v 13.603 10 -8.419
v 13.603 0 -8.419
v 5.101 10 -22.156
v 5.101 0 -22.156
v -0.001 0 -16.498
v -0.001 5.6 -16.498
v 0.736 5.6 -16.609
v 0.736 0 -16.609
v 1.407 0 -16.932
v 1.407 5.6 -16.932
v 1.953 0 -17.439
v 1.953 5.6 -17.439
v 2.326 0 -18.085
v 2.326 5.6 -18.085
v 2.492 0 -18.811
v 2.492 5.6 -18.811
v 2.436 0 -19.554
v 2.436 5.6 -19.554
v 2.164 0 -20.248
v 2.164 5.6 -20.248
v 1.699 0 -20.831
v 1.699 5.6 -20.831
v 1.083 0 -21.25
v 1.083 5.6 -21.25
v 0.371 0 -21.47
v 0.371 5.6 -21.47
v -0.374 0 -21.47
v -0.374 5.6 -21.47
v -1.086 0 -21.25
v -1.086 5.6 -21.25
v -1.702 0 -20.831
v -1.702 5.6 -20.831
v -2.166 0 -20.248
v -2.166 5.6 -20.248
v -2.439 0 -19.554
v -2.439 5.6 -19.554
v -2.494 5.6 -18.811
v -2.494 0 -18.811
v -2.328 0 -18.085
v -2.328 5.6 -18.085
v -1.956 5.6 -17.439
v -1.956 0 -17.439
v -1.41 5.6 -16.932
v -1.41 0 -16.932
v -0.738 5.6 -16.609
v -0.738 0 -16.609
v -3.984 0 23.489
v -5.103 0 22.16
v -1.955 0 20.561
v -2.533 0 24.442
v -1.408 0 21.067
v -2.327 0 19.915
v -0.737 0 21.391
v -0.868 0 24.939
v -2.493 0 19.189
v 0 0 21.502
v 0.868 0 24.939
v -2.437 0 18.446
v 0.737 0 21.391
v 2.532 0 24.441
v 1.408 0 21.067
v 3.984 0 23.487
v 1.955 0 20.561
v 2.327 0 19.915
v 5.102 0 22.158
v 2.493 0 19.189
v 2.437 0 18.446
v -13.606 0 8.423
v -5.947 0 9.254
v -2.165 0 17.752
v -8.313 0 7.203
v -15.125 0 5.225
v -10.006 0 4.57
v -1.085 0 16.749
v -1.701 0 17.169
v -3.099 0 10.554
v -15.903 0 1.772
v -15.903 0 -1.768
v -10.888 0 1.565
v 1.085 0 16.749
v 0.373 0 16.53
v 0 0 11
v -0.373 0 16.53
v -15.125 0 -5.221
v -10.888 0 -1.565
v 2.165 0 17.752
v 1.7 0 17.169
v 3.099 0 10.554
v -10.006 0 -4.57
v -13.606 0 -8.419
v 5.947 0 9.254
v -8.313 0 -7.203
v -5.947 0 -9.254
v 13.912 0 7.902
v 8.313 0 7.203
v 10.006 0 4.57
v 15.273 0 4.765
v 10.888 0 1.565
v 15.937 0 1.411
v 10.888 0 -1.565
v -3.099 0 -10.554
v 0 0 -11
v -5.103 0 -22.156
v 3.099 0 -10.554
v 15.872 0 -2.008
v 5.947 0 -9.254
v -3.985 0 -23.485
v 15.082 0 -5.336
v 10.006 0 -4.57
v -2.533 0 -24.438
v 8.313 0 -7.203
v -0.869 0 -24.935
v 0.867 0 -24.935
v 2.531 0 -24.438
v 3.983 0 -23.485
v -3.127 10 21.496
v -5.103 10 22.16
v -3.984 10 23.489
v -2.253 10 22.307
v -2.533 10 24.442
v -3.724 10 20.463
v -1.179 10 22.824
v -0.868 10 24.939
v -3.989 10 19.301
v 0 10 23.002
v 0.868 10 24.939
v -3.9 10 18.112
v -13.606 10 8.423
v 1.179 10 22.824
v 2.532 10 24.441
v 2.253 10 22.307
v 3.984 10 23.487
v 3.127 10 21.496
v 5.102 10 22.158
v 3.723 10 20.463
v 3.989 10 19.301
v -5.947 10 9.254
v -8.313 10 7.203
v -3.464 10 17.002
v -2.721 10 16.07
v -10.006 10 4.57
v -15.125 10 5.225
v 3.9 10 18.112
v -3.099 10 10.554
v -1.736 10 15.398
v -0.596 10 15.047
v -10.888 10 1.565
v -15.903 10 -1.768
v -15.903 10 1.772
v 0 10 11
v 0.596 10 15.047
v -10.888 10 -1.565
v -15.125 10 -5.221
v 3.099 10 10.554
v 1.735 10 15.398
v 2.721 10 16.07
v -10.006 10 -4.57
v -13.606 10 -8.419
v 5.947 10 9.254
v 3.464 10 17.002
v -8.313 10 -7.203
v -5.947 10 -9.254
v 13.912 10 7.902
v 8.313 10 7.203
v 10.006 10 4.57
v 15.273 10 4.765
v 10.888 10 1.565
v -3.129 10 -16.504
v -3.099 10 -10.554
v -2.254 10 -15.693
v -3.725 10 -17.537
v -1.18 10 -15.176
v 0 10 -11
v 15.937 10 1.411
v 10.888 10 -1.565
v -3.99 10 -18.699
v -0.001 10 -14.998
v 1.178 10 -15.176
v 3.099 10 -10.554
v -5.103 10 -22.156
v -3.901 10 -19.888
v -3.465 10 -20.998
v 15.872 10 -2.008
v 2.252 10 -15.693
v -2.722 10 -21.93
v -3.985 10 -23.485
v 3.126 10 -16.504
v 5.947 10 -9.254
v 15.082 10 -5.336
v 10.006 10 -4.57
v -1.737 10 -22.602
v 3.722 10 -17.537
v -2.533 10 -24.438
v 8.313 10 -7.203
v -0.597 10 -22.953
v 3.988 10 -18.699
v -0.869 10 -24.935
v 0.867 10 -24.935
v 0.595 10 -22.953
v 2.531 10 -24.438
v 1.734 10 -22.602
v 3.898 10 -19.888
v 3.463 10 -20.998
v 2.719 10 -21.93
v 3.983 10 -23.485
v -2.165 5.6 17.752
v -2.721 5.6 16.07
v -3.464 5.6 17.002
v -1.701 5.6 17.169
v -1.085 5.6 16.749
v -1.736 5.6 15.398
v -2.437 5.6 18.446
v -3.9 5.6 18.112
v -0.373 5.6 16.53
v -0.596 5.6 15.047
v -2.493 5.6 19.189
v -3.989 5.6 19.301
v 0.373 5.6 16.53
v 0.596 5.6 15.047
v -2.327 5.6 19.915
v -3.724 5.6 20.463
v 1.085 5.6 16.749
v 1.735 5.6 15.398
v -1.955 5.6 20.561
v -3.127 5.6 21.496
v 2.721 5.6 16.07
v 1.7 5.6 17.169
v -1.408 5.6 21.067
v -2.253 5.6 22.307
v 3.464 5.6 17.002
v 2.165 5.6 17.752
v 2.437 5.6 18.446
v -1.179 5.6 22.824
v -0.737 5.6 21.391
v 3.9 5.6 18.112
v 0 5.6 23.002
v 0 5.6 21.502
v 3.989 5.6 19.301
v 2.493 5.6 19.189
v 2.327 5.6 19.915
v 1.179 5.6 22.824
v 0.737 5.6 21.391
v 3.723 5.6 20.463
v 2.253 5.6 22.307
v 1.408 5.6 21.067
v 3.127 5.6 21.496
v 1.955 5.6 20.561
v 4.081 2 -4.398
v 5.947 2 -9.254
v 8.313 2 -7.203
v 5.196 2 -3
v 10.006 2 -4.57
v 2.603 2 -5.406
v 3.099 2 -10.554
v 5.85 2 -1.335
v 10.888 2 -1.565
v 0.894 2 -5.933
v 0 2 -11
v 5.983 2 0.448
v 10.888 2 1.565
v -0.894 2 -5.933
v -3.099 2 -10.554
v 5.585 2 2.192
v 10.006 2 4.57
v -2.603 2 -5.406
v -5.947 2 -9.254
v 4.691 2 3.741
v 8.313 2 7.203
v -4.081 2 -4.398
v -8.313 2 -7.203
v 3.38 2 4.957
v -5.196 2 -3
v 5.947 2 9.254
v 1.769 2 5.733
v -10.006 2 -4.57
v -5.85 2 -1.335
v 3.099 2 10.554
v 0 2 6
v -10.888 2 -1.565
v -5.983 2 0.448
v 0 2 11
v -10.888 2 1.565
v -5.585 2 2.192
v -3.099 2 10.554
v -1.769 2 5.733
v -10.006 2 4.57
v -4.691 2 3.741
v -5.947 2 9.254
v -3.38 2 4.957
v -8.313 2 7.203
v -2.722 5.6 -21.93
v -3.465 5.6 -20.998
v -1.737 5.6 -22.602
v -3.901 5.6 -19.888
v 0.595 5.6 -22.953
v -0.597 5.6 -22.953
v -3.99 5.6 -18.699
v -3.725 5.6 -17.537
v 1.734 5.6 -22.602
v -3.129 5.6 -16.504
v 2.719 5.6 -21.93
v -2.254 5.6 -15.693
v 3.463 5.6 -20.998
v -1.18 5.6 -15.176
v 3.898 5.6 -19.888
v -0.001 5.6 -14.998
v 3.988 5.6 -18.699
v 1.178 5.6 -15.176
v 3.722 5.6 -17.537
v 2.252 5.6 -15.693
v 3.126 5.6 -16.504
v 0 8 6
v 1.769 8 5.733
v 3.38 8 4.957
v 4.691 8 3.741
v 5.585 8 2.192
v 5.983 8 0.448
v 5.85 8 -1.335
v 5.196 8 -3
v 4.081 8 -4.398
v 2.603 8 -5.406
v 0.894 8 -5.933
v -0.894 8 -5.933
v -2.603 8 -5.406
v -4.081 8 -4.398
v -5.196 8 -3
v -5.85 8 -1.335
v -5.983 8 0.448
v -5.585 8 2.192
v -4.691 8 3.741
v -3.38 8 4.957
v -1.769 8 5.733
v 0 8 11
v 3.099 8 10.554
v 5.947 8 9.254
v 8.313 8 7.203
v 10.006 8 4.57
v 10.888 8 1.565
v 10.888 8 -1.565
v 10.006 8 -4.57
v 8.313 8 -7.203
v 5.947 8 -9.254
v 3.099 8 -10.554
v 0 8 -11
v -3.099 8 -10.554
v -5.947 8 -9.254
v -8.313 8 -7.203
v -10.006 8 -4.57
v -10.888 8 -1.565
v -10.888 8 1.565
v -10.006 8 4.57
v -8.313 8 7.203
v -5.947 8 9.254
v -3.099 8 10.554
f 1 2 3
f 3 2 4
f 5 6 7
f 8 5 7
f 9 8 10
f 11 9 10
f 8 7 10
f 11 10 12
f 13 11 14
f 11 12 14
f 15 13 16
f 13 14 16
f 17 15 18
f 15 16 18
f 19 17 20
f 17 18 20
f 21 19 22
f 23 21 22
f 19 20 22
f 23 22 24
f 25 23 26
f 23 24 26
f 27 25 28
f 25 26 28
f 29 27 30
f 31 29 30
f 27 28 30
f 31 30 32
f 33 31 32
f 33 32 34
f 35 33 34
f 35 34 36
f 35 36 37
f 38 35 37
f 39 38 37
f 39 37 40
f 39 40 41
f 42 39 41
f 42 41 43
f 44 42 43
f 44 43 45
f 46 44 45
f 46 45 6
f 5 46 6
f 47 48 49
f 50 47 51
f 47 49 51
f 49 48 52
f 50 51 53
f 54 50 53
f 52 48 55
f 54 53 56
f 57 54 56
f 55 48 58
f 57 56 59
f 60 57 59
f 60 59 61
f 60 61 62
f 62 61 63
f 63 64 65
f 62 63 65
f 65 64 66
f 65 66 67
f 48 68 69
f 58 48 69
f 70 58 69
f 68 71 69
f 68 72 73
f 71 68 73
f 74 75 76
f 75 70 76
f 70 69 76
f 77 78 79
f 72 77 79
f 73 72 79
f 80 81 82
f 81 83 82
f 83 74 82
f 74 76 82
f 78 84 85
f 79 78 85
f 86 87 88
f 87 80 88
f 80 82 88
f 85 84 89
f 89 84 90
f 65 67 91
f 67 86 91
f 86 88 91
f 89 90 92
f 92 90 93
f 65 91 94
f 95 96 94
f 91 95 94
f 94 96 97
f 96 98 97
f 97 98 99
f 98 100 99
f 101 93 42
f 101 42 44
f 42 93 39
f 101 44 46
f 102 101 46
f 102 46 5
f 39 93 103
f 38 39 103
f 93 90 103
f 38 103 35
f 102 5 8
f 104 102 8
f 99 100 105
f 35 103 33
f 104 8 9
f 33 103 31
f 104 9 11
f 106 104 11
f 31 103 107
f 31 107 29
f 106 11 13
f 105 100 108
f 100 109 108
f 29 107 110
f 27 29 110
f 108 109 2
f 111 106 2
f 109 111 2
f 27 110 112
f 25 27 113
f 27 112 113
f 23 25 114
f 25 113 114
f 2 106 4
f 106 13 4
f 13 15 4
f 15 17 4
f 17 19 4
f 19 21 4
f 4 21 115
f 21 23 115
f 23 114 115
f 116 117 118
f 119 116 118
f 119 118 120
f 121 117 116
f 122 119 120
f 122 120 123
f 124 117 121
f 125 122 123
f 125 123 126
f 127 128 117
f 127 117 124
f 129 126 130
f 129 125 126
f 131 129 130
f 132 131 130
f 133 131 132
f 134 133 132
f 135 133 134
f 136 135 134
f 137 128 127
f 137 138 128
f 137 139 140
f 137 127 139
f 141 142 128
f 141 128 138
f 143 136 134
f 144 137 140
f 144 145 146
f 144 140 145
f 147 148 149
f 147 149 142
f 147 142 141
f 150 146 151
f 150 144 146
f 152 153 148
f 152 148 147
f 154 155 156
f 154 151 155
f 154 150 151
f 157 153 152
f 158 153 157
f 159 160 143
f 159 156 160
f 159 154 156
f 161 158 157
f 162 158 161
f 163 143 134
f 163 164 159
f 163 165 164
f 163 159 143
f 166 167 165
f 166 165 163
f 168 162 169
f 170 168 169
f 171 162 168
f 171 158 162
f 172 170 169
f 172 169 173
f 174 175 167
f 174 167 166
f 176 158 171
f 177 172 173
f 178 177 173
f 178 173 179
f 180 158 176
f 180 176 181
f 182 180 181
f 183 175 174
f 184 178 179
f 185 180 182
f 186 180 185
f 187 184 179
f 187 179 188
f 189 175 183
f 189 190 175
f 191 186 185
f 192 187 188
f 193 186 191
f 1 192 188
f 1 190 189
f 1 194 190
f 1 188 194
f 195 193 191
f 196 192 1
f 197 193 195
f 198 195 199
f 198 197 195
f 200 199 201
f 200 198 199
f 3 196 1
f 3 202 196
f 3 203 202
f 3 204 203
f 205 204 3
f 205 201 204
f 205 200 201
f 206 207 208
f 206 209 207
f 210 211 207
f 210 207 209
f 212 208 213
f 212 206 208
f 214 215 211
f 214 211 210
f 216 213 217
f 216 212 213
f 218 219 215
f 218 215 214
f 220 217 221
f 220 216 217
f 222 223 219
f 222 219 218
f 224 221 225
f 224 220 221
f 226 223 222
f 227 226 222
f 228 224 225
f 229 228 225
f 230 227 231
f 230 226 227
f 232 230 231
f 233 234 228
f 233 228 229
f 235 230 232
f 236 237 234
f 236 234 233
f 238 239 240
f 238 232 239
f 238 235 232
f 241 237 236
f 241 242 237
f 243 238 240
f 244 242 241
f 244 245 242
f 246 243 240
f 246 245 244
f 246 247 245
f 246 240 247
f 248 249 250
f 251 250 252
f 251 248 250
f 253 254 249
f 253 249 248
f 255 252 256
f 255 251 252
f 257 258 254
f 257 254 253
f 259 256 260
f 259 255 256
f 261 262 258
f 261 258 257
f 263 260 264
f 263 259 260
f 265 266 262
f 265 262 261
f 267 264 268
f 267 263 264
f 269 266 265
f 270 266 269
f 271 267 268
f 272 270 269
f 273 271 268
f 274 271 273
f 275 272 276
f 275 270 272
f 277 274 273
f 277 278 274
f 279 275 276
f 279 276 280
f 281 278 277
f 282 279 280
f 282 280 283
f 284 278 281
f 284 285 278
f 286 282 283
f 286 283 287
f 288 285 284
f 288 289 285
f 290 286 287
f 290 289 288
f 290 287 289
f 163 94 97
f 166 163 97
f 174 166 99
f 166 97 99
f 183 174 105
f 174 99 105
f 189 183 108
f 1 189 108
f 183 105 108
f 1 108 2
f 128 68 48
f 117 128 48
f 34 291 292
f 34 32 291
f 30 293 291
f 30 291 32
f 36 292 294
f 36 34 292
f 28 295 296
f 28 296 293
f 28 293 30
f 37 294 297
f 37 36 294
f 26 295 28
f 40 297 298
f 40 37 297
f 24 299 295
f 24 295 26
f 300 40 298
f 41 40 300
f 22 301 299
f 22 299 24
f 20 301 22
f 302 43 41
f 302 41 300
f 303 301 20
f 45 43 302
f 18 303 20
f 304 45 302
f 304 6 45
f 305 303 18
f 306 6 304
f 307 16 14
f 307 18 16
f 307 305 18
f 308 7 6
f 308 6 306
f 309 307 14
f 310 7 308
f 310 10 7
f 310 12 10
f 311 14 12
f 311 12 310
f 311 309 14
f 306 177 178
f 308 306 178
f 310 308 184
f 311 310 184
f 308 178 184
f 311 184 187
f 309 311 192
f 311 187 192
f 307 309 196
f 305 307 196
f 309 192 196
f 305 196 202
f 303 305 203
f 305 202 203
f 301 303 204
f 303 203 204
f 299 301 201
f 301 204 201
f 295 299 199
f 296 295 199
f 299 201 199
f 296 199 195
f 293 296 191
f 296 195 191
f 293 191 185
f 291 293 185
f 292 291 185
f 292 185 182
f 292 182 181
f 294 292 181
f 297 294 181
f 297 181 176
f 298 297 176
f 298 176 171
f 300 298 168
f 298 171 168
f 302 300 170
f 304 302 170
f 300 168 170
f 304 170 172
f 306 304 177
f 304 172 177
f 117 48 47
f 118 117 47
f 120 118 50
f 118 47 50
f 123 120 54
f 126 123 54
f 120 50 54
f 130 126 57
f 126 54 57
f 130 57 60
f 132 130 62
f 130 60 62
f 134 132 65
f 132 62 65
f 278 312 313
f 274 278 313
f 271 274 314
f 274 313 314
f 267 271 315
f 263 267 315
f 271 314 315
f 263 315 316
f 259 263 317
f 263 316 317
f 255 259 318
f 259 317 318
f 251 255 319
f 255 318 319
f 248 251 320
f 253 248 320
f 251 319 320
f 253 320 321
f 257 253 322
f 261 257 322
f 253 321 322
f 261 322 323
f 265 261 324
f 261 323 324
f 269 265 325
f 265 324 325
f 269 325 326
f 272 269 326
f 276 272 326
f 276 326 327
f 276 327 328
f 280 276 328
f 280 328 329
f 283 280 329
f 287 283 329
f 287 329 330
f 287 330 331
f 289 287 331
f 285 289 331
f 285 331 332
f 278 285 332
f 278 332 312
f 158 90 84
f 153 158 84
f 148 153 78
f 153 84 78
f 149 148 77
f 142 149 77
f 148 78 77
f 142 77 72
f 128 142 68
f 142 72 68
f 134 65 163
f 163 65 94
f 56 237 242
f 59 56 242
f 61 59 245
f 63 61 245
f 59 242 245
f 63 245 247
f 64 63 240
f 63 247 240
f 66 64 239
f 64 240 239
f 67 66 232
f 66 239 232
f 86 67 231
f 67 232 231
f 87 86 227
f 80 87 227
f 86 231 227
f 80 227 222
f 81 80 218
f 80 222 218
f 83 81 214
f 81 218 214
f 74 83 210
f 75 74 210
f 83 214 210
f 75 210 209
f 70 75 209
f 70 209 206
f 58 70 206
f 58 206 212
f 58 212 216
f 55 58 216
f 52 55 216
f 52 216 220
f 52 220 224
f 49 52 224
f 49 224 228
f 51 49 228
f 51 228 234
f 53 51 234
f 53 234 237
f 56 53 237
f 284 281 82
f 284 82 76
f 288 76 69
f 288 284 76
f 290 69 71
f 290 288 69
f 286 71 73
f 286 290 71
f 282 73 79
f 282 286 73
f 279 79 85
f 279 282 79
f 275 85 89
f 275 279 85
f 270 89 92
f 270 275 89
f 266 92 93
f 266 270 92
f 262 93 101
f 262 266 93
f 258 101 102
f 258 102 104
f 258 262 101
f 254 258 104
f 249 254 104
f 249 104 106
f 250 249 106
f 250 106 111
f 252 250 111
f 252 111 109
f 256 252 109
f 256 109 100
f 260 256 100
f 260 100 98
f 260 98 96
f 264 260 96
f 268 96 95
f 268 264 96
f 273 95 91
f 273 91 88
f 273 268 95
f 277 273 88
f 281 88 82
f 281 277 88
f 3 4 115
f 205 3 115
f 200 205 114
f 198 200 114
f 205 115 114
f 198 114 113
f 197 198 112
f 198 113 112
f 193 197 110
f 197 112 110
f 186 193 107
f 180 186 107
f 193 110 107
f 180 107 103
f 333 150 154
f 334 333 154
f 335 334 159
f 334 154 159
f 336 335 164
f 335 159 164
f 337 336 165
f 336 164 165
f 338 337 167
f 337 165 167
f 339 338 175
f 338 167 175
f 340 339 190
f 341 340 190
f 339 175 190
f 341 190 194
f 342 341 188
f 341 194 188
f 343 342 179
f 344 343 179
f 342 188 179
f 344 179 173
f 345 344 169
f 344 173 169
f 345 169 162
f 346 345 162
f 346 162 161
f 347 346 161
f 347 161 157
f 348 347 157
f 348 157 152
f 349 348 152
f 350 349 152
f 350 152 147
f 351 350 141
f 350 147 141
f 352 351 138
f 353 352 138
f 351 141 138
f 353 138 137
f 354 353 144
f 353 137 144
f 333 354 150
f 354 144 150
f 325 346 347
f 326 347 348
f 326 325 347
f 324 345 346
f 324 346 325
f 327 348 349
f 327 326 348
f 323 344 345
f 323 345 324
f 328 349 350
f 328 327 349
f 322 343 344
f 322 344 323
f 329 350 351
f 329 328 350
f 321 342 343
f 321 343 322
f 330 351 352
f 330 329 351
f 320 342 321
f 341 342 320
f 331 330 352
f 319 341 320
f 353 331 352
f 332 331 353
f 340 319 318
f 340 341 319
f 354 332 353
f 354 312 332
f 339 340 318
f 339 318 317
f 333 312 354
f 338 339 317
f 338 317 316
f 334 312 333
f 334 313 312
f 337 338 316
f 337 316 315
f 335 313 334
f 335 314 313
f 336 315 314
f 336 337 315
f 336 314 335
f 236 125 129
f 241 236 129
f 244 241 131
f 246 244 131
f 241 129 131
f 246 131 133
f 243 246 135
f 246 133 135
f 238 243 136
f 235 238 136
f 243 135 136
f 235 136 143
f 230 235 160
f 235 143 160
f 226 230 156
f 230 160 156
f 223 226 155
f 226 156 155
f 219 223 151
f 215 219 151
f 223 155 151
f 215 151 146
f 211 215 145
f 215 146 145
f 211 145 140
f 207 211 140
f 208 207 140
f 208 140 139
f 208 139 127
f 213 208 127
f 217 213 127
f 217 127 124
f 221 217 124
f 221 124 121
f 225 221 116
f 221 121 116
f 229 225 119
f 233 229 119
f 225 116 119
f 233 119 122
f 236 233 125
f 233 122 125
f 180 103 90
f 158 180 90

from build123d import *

# Parameters (mm, degrees)
BOSS_EXTRUDE1_DEPTH = 10
SKETCH2_R           = 3.99997531
SKETCH2_R_2         = 4
CUT_EXTRUDE1_DEPTH  = 4.4
CUT_EXTRUDE2_REACH  = 32.207
SKETCH3_R           = 2.5
SKETCH4_R           = 11
CUT_EXTRUDE3_DEPTH  = 2
CUT_EXTRUDE4_REACH  = 32.743
SKETCH5_R           = 6
CUT_EXTRUDE5_START  = -2
SKETCH6_R           = 11
CUT_EXTRUDE5_DEPTH  = 2


with BuildPart() as part:
    # Sketch1 → Boss-Extrude1 (new body)
    with BuildSketch(Plane(origin=(0, 0, 0), x_dir=(1, 0, 0), z_dir=(0, 1, 0))):
        with BuildLine():
            Line((-5.103019764, 22.15600792), (-13.605911567, 8.419165811))
            ThreePointArc((-13.605911567, 8.419165811), (-16.001261955, -0.002028565), (-13.605722542, -8.423169172))
            Line((-13.605722542, -8.423169172), (-5.102675537, -22.159834758))
            ThreePointArc((-5.102675537, -22.159834758), (-6.8217e-05, -25.001848451), (5.101614332, -22.158175041))
            Line((5.101614332, -22.158175041), (13.912148597, -7.902456622))
            ThreePointArc((13.912148597, -7.902456622), (15.995958201, 0.300682208), (13.603482502, 8.419167853))
            Line((13.603482502, 8.419167853), (5.100590702, 22.156009965))
            ThreePointArc((5.100590702, 22.156009965), (-0.0012151, 24.998151536), (-5.103019764, 22.15600792))
        make_face()
    extrude(amount=BOSS_EXTRUDE1_DEPTH)

    # Sketch2 → Cut-Extrude1 (cut)
    with BuildSketch(Plane(origin=(0, 10, 0), x_dir=(1, 0, 0), z_dir=(0, 1, 0))):
        with Locations((-0.001213898, 18.998067086)):
            Circle(SKETCH2_R)
        with Locations((-6.8217e-05, -19.001848451)):
            Circle(SKETCH2_R_2)
    extrude(amount=-CUT_EXTRUDE1_DEPTH, mode=Mode.SUBTRACT)

    # Sketch3 → Cut-Extrude2 (cut, up to next)
    with BuildSketch(Plane(origin=(0, 5.6, 0), x_dir=(1, 0, 0), z_dir=(0, 1, 0)), mode=Mode.PRIVATE) as cut_extrude2_sk1:
        with Locations((-0.001213898, 18.998067086)):
            Circle(SKETCH3_R)
    cut_extrude2_tool1 = extrude(cut_extrude2_sk1.sketch, amount=-CUT_EXTRUDE2_REACH, mode=Mode.PRIVATE) & part.part
    # Sketch3 → Cut-Extrude2 (cut, up to next)
    with BuildSketch(Plane(origin=(0, 5.6, 0), x_dir=(1, 0, 0), z_dir=(0, 1, 0)), mode=Mode.PRIVATE) as cut_extrude2_sk2:
        with Locations((-6.8217e-05, -19.001848451)):
            Circle(SKETCH3_R)
    cut_extrude2_tool2 = extrude(cut_extrude2_sk2.sketch, amount=-CUT_EXTRUDE2_REACH, mode=Mode.PRIVATE) & part.part
    add(cut_extrude2_tool1.solids().sort_by_distance((-0.001214, 5.6, -18.998067))[0], mode=Mode.SUBTRACT)
    add(cut_extrude2_tool2.solids().sort_by_distance((-6.8e-05, 5.6, 19.001848))[0], mode=Mode.SUBTRACT)

    # Sketch4 → Cut-Extrude3 (cut)
    with BuildSketch(Plane(origin=(0, 10, 0), x_dir=(1, 0, 0), z_dir=(0, 1, 0))):
        Circle(SKETCH4_R)
    extrude(amount=-CUT_EXTRUDE3_DEPTH, mode=Mode.SUBTRACT)

    # Sketch5 → Cut-Extrude4 (cut, up to next)
    with BuildSketch(Plane(origin=(0, 8, 0), x_dir=(1, 0, 0), z_dir=(0, 1, 0)), mode=Mode.PRIVATE) as cut_extrude4_sk1:
        Circle(SKETCH5_R)
    cut_extrude4_tool1 = extrude(cut_extrude4_sk1.sketch, amount=-CUT_EXTRUDE4_REACH, mode=Mode.PRIVATE) & part.part
    add(cut_extrude4_tool1.solids().sort_by_distance((0, 8, 0))[0], mode=Mode.SUBTRACT)

    # Sketch6 → Cut-Extrude5 (cut)
    with BuildSketch(Plane.XZ.offset(CUT_EXTRUDE5_START)):
        Circle(SKETCH6_R)
    extrude(amount=CUT_EXTRUDE5_DEPTH, mode=Mode.SUBTRACT)


solid = part.part
